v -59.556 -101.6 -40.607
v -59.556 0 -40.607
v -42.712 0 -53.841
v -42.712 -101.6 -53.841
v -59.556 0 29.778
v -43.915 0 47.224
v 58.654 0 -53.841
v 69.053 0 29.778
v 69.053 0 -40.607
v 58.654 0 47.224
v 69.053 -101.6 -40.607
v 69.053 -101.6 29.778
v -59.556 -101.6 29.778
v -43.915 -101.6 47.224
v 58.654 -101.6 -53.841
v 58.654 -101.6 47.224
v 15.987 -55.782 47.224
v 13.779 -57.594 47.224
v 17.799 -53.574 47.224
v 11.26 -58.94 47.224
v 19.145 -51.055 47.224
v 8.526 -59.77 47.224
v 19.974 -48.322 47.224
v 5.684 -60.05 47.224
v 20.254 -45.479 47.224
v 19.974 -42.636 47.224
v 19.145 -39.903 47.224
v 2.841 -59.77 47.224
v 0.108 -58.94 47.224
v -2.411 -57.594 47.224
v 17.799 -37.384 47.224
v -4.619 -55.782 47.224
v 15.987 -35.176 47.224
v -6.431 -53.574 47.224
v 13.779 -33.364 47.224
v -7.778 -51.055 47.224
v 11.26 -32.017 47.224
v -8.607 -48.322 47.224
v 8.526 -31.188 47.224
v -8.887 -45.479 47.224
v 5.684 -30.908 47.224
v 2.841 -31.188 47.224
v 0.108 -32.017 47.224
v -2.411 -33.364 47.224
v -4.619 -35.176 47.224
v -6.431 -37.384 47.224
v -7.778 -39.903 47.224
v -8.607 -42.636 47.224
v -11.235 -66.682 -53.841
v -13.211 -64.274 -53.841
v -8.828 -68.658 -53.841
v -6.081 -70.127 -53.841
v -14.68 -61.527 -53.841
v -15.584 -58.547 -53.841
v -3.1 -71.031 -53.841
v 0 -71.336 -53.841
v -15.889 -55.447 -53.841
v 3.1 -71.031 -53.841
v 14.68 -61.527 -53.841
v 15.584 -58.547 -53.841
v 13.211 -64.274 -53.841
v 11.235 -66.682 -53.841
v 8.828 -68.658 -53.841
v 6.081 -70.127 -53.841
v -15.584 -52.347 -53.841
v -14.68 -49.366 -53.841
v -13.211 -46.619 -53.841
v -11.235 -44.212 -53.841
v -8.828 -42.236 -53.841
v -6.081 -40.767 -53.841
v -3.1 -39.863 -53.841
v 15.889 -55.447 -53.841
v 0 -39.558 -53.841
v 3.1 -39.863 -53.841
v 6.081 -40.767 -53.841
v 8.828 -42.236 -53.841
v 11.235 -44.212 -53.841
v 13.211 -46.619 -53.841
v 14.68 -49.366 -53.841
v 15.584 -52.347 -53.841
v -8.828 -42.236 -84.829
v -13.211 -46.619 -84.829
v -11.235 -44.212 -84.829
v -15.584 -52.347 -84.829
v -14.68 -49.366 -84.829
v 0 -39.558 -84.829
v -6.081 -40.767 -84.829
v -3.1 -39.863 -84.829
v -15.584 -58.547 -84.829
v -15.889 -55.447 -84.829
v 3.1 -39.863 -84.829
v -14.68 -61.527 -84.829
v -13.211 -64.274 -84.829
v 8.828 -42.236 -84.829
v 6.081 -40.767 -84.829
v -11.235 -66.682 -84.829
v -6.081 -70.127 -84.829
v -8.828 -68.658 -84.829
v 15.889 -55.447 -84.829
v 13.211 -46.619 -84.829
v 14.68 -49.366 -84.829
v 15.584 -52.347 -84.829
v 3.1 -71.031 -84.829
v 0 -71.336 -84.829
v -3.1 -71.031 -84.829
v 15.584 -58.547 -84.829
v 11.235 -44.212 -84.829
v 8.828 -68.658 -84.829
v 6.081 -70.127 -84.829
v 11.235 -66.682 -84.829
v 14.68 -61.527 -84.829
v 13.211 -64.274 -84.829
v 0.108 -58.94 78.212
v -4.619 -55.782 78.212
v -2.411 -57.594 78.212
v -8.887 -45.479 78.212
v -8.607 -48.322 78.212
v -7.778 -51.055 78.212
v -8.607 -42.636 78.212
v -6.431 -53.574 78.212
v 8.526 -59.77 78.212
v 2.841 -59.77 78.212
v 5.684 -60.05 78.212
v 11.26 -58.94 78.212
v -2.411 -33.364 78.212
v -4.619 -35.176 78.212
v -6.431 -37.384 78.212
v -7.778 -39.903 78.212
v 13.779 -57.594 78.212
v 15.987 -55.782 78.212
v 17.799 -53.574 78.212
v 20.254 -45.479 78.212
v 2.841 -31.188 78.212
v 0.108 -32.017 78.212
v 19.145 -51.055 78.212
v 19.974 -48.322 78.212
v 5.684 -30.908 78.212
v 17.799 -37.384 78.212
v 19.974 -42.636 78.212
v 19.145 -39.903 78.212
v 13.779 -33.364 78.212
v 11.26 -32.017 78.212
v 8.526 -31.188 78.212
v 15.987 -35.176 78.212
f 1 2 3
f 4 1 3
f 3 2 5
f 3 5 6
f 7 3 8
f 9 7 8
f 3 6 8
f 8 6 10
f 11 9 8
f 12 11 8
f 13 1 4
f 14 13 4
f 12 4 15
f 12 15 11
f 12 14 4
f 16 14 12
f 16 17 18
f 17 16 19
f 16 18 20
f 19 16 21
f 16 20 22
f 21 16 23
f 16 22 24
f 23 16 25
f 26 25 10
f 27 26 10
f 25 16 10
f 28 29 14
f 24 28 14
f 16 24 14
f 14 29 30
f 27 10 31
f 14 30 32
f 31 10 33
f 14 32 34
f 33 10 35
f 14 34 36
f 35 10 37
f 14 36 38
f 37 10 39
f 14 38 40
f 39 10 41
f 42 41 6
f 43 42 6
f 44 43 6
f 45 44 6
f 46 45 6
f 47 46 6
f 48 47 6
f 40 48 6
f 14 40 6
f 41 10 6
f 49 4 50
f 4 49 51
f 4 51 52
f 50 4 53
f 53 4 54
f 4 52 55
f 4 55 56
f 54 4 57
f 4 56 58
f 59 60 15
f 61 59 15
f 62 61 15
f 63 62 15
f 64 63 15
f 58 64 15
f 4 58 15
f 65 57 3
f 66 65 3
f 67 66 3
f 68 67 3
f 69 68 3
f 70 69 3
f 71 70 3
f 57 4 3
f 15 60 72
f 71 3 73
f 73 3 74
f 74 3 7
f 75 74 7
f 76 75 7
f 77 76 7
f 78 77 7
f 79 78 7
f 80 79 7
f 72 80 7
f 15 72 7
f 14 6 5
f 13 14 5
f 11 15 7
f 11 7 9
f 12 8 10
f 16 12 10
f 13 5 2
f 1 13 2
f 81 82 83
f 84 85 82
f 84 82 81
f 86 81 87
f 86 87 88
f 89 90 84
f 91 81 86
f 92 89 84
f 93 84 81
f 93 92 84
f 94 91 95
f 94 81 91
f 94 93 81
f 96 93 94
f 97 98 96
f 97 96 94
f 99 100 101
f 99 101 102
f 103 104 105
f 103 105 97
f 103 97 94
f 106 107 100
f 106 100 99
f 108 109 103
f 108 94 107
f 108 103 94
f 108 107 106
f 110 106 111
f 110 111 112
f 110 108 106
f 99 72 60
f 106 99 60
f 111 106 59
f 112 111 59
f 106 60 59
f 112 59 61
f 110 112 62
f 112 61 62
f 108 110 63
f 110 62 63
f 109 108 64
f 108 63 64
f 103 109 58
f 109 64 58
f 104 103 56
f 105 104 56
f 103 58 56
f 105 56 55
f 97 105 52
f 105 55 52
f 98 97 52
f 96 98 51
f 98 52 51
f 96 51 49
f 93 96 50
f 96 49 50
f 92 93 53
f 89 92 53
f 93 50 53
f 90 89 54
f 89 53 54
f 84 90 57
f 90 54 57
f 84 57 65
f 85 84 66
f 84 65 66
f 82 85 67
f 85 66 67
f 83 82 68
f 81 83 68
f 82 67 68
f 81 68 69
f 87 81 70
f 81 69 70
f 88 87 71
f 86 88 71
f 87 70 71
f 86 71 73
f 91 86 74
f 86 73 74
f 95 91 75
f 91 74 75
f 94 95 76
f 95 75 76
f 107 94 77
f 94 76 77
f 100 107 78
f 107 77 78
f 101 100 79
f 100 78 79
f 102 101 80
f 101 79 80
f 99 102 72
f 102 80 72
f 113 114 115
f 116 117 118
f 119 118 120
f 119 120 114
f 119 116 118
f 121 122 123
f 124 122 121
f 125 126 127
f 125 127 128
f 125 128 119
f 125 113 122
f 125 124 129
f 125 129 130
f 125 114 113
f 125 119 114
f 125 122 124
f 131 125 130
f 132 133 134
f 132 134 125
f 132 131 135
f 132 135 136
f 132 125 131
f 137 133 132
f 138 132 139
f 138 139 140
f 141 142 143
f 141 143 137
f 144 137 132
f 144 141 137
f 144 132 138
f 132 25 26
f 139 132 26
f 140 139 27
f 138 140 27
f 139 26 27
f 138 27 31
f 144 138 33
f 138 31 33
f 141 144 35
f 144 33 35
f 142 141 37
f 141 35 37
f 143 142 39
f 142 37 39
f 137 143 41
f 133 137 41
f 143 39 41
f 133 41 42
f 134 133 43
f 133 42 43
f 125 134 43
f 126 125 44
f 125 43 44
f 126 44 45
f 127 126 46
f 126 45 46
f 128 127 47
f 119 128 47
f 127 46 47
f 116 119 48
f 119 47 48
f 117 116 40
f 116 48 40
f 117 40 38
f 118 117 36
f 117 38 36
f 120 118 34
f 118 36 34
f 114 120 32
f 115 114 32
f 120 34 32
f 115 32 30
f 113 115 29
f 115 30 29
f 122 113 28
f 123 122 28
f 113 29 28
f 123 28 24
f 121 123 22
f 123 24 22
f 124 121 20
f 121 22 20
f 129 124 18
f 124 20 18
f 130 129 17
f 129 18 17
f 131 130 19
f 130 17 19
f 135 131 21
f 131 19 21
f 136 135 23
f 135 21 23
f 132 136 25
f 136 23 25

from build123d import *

# Parameters (mm, degrees)
F1_DEPTH = 101.6
F2_R     = 14.570657
F3_DEPTH = 30.988
F4_R     = 15.889172
F5_DEPTH = 30.988


with BuildPart() as f1:
    # F0 (on Front) → F1 (new body)
    with BuildSketch(Plane.XZ):
        Polygon((58.653947, 47.223948), (-43.915264, 47.223948), (-59.556317, 29.778158), (-59.556317, -40.606577), (-42.712107, -53.841315), (58.653947, -53.841315), (69.052672, -40.606577), (69.052672, 29.778158), align=None)
    extrude(amount=F1_DEPTH)

    # F2 (on face) → F3 (join)
    with BuildSketch(Plane.XY.offset(47.223948)):
        with Locations((5.683666, -45.478929)):
            Circle(F2_R)
    extrude(amount=F3_DEPTH)

    # F4 (on face) → F5 (join)
    with BuildSketch(Plane(origin=(0, 0, -53.841315), x_dir=(1, 0, 0), z_dir=(0, 0, -1))):
        with Locations((0, 55.446912)):
            Circle(F4_R)
    extrude(amount=F5_DEPTH)


solid = f1.part
